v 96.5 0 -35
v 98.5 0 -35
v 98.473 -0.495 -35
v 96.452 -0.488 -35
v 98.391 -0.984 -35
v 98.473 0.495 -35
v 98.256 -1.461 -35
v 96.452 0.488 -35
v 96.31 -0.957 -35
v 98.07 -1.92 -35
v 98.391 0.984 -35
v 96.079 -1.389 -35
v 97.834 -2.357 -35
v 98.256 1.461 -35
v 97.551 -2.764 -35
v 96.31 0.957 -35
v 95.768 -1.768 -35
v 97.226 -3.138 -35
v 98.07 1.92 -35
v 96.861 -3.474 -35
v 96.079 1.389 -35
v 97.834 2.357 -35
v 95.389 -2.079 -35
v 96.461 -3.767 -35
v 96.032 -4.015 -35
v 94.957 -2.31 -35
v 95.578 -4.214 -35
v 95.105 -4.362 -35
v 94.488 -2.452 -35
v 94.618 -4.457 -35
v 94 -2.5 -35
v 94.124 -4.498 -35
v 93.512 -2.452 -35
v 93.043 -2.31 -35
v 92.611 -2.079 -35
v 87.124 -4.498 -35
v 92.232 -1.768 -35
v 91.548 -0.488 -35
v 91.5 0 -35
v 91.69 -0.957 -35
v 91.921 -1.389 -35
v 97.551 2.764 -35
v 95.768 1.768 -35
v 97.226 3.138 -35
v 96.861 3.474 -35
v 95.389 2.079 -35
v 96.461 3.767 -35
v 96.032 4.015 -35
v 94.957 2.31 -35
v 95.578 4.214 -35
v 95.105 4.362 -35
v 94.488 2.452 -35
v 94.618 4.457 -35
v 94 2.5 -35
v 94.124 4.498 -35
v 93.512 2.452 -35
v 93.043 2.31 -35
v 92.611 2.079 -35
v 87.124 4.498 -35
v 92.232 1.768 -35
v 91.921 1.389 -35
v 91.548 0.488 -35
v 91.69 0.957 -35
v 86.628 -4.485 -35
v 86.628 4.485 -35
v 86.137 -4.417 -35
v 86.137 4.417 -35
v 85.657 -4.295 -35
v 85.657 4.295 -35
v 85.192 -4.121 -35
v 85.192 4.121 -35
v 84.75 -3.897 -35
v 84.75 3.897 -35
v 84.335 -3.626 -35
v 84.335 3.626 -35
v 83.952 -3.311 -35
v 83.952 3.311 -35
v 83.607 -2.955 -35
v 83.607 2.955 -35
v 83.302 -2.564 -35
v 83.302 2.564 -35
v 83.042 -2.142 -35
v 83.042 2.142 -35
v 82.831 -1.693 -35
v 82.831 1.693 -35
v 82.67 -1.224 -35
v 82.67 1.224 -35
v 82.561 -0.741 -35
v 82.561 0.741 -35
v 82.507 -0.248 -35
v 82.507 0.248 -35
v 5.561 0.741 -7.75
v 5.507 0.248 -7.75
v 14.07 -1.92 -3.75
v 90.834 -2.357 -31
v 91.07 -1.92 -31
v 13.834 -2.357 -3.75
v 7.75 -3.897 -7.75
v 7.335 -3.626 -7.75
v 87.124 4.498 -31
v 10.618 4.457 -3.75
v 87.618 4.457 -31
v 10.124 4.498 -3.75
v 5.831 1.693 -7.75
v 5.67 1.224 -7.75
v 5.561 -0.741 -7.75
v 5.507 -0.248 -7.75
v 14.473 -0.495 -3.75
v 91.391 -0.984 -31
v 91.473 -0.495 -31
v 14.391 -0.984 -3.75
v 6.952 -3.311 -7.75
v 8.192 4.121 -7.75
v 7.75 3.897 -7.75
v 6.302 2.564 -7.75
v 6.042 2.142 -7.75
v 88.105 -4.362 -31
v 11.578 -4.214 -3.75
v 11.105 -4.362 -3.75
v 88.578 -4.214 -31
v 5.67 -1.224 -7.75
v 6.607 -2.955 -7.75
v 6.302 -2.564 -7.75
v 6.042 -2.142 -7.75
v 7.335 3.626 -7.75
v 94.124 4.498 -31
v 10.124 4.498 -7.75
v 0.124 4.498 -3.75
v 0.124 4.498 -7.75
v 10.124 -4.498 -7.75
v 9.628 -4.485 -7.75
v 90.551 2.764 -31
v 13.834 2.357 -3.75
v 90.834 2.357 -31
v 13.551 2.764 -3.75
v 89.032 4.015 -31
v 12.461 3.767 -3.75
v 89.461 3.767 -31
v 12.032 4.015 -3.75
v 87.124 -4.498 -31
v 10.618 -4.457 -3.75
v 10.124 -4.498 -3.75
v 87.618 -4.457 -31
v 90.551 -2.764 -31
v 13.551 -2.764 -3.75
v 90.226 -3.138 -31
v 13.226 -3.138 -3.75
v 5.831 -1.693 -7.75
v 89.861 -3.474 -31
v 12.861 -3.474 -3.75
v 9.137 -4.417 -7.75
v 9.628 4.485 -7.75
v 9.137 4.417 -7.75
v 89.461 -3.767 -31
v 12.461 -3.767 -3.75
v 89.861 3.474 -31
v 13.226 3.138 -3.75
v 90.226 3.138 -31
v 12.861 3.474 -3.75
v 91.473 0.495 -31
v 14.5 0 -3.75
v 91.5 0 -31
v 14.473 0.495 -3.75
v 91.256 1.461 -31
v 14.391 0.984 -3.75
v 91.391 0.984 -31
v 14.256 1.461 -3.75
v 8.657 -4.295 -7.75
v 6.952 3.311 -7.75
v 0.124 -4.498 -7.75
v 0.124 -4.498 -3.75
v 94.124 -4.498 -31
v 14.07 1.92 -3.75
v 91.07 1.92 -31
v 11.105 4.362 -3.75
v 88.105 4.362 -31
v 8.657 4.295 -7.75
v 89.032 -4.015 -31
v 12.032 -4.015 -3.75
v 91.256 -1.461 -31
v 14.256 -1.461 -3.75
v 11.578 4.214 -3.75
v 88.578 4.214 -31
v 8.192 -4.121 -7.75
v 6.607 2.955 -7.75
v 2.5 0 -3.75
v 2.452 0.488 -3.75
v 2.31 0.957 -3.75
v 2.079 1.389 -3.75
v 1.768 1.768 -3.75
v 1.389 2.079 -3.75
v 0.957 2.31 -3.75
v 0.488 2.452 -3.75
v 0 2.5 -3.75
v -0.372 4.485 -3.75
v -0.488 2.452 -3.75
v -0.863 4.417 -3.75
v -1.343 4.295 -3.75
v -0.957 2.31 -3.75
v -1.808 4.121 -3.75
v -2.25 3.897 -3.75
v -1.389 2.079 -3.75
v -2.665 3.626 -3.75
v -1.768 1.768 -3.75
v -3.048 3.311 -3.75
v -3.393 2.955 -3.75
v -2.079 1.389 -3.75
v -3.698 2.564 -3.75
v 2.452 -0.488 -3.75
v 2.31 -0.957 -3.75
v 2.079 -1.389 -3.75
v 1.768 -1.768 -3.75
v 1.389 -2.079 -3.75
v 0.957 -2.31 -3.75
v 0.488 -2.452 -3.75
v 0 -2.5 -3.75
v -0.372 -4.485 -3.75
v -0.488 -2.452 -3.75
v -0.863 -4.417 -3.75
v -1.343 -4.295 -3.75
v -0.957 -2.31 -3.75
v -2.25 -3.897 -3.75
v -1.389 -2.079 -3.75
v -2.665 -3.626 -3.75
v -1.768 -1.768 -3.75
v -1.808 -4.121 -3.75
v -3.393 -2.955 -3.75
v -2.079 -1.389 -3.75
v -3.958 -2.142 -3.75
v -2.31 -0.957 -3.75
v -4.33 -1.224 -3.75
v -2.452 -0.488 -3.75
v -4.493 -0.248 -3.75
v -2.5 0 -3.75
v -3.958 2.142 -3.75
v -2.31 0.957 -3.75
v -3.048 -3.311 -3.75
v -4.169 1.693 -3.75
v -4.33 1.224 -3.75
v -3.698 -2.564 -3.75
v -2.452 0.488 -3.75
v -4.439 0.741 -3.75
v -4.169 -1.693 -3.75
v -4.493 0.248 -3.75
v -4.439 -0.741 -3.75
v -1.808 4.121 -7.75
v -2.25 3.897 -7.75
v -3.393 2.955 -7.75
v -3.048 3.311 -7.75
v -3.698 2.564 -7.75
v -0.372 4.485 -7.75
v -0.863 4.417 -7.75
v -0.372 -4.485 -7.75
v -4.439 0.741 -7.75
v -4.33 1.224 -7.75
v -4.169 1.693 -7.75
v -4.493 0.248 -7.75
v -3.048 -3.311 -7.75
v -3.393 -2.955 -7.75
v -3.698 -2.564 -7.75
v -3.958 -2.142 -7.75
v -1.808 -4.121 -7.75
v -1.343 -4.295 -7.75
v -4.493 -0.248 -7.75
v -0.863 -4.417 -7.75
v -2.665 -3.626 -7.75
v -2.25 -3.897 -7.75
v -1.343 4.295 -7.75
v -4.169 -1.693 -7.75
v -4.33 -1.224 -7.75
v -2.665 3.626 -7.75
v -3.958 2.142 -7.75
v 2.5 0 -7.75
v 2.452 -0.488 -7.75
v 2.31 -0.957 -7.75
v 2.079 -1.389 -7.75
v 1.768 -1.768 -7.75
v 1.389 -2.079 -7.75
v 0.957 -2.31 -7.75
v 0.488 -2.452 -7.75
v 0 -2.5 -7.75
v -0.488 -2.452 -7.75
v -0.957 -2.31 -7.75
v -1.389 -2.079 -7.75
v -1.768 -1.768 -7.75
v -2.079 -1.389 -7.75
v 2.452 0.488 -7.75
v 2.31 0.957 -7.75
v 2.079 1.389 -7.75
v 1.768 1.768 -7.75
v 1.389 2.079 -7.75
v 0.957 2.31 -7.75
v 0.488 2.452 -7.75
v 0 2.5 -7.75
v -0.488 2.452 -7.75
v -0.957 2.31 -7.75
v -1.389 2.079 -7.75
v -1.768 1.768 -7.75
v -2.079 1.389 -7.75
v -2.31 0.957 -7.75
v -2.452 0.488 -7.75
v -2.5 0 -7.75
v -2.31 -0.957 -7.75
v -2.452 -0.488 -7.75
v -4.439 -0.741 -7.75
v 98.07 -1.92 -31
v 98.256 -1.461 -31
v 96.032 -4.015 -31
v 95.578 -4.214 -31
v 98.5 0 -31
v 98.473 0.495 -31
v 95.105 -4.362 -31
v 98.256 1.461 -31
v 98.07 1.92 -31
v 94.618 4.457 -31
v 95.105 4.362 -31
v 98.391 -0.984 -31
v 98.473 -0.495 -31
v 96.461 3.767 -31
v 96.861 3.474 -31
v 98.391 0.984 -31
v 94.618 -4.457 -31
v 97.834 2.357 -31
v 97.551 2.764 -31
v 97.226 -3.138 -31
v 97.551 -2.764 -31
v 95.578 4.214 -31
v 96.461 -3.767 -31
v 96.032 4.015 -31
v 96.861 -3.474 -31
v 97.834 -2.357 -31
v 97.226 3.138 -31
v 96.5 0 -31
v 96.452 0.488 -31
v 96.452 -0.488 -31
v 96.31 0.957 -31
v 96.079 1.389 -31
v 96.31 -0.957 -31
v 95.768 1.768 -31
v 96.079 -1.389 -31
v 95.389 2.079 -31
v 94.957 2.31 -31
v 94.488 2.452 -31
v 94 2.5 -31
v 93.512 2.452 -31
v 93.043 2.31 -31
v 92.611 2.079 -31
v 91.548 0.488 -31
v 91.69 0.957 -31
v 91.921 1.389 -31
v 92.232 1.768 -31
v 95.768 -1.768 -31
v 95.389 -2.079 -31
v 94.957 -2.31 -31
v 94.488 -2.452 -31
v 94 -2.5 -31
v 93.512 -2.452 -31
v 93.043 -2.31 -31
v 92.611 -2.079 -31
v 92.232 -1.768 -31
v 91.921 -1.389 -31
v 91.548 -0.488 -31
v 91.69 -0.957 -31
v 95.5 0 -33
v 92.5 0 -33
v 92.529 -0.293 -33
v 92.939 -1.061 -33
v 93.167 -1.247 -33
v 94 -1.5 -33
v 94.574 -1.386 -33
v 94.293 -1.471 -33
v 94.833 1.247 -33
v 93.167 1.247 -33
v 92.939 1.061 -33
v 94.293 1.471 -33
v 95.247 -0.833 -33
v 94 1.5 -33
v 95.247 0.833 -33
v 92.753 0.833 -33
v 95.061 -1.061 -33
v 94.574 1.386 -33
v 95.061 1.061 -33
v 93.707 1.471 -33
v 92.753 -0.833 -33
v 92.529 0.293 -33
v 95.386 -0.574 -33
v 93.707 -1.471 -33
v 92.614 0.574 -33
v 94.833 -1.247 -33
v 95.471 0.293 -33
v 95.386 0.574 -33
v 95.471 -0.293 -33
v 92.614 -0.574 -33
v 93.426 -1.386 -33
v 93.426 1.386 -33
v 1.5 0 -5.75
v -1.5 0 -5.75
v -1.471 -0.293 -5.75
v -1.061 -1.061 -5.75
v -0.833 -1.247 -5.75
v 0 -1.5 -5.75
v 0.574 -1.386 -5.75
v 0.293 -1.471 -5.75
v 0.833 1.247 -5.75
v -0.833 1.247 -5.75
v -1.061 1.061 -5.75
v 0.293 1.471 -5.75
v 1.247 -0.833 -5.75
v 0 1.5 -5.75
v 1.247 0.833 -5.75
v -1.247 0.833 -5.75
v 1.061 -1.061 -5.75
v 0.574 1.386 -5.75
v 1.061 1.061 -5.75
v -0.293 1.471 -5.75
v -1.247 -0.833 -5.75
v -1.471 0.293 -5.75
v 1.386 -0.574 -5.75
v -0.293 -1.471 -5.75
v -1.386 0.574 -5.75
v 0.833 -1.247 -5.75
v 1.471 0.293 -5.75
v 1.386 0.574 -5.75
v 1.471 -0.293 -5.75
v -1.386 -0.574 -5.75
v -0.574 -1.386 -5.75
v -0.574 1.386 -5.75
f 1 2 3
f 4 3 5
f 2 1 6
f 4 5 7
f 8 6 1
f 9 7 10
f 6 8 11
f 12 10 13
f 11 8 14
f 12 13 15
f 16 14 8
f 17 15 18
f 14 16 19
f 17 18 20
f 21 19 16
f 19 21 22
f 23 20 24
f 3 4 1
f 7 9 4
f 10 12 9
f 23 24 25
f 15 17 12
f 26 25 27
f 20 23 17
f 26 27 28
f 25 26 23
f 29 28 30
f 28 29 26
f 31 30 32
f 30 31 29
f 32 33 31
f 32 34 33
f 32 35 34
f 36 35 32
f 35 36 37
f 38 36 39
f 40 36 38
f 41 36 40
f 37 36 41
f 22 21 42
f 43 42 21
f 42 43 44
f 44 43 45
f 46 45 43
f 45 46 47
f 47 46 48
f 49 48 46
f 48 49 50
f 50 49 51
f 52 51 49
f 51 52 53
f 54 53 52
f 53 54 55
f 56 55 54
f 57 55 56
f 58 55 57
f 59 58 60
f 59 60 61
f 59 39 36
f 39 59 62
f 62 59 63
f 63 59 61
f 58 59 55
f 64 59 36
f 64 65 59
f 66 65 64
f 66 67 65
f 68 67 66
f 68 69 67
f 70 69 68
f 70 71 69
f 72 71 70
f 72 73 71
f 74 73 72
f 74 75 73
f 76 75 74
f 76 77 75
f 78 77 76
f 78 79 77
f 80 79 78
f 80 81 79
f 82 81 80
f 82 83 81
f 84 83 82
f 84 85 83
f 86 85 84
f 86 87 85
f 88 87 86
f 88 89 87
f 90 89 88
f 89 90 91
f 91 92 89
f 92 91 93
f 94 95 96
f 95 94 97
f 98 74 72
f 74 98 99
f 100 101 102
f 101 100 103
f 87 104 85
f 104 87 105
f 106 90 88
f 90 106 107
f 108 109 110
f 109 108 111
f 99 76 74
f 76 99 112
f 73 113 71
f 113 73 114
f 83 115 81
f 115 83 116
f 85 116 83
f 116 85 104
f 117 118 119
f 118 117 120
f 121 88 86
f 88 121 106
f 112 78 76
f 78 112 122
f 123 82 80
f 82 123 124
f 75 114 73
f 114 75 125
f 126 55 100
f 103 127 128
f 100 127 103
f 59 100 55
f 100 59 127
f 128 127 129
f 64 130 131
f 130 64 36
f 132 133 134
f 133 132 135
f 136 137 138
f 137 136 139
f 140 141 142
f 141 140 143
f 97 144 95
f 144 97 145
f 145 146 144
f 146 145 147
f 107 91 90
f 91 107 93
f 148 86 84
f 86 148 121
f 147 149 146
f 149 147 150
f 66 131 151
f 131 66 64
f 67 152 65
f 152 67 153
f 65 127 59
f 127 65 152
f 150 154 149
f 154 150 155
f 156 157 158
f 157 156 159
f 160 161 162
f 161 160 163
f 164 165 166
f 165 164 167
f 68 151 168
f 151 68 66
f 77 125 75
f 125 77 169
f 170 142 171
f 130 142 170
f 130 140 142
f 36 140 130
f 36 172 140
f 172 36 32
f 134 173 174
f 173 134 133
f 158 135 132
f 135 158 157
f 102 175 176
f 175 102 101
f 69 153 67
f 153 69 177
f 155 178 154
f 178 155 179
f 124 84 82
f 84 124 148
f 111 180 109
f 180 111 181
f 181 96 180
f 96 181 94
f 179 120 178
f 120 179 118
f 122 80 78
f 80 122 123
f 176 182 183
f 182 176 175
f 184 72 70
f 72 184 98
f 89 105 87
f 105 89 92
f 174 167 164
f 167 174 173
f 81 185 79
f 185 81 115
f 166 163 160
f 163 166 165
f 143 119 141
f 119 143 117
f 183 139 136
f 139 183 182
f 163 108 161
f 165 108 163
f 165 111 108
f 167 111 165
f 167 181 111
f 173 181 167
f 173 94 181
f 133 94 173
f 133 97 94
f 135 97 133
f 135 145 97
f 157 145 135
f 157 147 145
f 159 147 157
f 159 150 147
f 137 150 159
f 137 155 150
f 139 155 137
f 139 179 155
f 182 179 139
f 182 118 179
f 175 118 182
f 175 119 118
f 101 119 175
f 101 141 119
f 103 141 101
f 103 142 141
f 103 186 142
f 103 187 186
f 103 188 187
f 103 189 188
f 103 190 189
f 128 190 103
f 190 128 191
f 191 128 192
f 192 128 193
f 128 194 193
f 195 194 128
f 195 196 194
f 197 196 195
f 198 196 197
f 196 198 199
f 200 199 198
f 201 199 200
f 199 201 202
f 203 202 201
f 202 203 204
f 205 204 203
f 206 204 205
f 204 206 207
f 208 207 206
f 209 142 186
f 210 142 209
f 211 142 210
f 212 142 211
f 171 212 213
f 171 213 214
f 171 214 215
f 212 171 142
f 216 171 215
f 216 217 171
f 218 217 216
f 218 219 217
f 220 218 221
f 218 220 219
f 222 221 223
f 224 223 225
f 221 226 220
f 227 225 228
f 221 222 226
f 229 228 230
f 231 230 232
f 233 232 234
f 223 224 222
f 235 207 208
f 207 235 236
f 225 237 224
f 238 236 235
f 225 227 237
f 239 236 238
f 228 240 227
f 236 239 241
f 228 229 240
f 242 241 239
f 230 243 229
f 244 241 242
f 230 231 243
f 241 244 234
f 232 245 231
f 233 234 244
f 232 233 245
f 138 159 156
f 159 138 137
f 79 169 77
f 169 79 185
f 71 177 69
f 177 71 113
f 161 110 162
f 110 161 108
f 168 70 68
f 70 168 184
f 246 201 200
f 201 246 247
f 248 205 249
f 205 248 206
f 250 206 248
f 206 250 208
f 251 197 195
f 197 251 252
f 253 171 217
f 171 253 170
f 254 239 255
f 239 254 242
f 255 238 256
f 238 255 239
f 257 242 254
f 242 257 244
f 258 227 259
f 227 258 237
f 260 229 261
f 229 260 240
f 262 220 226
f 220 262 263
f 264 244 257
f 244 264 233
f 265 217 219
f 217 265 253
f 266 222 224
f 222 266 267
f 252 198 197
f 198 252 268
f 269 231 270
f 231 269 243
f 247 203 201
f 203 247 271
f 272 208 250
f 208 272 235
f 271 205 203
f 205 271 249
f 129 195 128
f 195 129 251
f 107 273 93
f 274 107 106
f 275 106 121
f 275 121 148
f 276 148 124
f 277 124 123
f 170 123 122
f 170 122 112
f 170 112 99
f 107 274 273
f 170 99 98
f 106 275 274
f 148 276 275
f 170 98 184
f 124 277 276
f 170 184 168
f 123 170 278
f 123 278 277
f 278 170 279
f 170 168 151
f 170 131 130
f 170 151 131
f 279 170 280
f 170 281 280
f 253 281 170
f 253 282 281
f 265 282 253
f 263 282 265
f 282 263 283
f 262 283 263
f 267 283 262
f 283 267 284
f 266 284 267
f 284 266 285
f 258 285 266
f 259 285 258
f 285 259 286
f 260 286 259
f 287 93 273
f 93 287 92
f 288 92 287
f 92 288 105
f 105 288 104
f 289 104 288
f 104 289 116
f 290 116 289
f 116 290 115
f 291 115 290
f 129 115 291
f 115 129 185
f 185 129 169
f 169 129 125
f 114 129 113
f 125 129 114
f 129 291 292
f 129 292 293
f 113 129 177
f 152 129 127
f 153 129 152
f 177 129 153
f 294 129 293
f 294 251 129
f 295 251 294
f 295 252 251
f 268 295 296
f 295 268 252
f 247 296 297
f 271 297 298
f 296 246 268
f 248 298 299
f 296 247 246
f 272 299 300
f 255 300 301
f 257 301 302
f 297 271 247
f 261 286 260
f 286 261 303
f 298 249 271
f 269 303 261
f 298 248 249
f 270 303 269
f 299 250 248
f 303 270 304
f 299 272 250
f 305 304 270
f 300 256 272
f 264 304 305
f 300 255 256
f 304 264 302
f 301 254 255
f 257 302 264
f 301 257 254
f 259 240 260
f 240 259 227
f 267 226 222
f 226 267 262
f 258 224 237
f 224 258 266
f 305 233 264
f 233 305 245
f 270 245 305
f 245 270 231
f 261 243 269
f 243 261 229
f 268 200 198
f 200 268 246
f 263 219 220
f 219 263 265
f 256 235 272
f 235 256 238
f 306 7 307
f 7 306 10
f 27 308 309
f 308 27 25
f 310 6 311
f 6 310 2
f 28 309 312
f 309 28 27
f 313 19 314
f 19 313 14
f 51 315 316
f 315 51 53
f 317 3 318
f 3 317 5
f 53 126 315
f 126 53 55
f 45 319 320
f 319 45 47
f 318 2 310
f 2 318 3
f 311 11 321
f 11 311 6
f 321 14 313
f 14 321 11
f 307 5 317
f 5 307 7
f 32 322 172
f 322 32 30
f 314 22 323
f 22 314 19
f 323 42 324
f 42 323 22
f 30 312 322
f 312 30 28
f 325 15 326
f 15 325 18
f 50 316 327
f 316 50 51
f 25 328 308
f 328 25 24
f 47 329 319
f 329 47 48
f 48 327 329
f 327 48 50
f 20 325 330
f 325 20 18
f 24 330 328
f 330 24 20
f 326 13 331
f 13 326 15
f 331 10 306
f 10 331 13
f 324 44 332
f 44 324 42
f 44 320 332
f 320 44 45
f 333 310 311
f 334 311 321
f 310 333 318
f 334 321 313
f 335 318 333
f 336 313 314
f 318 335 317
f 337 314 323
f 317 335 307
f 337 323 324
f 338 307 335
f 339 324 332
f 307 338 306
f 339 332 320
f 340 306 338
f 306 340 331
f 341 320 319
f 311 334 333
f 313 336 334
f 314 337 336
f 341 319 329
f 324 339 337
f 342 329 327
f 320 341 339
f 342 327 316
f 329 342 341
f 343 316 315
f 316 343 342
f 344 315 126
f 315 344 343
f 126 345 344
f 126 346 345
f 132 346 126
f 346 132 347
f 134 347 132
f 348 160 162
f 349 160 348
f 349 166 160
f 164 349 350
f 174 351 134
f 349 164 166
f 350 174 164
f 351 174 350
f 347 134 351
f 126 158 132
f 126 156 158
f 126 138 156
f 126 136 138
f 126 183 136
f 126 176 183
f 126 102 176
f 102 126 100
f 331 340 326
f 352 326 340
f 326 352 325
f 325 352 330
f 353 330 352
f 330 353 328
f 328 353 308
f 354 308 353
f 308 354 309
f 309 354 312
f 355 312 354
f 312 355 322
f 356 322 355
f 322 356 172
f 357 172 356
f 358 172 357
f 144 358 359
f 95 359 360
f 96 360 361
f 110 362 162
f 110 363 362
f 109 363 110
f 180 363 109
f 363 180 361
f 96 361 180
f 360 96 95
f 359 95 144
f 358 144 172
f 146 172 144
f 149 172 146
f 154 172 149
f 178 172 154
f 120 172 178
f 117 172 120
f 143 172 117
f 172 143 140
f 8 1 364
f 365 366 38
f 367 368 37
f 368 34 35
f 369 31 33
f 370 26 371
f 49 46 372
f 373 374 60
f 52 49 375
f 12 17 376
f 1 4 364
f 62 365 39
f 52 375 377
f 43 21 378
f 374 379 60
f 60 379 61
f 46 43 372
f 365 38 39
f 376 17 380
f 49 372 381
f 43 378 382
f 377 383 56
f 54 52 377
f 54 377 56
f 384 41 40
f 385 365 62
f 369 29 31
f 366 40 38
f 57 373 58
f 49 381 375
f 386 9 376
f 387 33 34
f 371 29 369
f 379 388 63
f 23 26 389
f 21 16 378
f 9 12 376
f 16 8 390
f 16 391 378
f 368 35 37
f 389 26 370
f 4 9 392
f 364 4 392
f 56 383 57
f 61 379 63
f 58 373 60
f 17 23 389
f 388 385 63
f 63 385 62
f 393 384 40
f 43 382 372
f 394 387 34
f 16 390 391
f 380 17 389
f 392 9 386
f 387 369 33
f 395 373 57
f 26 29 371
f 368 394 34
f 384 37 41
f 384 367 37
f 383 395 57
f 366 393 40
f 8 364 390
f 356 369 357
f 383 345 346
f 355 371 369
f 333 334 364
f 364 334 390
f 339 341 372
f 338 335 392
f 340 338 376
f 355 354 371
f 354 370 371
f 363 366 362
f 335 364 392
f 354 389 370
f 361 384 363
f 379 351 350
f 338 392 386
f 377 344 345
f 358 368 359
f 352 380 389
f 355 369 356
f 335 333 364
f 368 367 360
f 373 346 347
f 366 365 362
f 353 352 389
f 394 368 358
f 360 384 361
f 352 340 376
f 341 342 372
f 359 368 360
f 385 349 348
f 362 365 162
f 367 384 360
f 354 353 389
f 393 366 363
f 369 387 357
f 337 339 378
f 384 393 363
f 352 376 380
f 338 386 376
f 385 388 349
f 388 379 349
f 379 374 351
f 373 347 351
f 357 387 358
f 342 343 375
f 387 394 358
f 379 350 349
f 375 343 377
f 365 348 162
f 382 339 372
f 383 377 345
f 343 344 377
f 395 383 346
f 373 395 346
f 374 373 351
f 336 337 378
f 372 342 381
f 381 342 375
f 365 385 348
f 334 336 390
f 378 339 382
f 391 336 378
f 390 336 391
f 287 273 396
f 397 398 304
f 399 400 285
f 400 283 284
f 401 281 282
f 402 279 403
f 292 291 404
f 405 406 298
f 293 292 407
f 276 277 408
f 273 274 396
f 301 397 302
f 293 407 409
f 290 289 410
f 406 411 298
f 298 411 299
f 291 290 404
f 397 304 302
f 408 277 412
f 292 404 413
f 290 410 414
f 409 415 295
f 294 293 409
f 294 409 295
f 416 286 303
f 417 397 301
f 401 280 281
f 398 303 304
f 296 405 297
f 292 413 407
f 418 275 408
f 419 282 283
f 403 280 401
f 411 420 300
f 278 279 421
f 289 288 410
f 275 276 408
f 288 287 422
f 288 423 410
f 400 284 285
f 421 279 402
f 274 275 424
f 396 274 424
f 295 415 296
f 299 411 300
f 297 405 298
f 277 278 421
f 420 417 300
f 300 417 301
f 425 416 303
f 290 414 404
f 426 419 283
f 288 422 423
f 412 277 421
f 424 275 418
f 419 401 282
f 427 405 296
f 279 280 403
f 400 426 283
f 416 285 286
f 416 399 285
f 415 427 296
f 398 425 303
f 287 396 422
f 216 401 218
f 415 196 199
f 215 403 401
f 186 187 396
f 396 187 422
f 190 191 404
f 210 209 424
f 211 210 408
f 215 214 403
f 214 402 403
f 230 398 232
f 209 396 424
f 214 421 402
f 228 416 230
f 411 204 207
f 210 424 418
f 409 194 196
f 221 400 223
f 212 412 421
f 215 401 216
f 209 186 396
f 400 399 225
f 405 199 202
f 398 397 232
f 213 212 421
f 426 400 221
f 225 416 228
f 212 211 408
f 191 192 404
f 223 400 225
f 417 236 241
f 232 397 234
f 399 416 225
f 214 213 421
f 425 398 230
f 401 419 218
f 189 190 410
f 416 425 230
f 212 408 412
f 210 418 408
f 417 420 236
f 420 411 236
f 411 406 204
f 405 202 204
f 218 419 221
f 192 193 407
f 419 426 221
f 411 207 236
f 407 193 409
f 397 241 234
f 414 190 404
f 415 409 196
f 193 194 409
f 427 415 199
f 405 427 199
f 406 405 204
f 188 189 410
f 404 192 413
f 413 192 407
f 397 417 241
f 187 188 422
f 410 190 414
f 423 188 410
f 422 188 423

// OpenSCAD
$fs = 0.5;
$fa = 5.1;


//lower_link(115);

upper_link(94);
//steeringlink(60);

module steeringlink(ll=60) {
    wall1 = 4;
    dd1 = 8;
    difference() {
        union(){
            hull() {
                translate([0,0,0]) cylinder(d=dd1, h=wall1);
                translate([10,0,0]) cylinder(d=dd1, h=wall1);
            }
            hull() {
                translate([10,0,0]) cylinder(d=dd1, h=wall1);
                translate([ll-10,0,dd1/2])rotate([90,0,0]) cylinder(d=dd1, h=wall1);
            }
            hull() {
                translate([ll,0,dd1/2])rotate([90,0,0]) cylinder(d=dd1, h=wall1);
                translate([ll-10,0,dd1/2])rotate([90,0,0]) cylinder(d=dd1, h=wall1);
            }
        }
        conehole(wall1);
        translate([ll,0,dd1/2])rotate([90,0,0]) conehole(wall1);
    }
    
    
}
module conehole(hh=10) {
    cylinder(d1=5, d2=3, h=hh/2);
    translate([0,0,hh/2]) cylinder(d1=3, d2=5, h=hh/2);
}
module upper_link(ll=94) {
    dd1 = 9;
    dd2 = 10;
    hh1 = 4;
    hh2 = 7.5+hh1*2;
    dist = 70;
    difference() {
        union(){
            hull() {
                translate([ll-7,0,-dist/2]) cylinder(d=dd1, h=hh1);
                translate([10,0,-hh2/2]) cylinder(d=dd1, h=hh1);
            }
            hull() {
                translate([0,0,-hh2/2]) cylinder(d=dd1, h=hh1);
                translate([10,0,-hh2/2]) cylinder(d=dd1, h=hh1);
            }
            hull() {
                translate([ll-7,0,-dist/2]) cylinder(d=dd1, h=hh1);
                translate([ll,0,-dist/2]) cylinder(d=dd1, h=hh1);
            }
        }
        
        translate([ll,0,-dist/2]) conehole(hh1);//cylinder(d=3, h=hh2+dist);
        translate([0,0,-hh2/2])  conehole(hh1);
            
    }
    
}

module lower_link(ll=115) {
    s_d = 4; // stångens diameter
    f_d = 4;
    tjock = 8.9;


    difference() {
        union(){
            hull() {
                cylinder(d=tjock, h=5);
                translate([ll,0,0]) cylinder(d=tjock, h=5);
                
            }
            hull() {
                translate([10,0,0]) cylinder(d=tjock, h=5);
                translate([ll/4,0,0]) cylinder(d=12, h=5);
                
            }
            hull() {
                translate([ll/4,0,0]) cylinder(d=12, h=5);
                translate([ll-ll/4,0,0]) cylinder(d=12, h=5);
                
            }
            hull() {
                translate([ll-ll/4,0,0]) cylinder(d=12, h=5);
                translate([ll-10,0,0]) cylinder(d=tjock, h=5);
                
                
            }
        }
        translate([0,0,0]) cylinder(d=f_d, h=15);
        translate([ll,0,0]) cylinder(d=f_d, h=15);
    }
        
}
